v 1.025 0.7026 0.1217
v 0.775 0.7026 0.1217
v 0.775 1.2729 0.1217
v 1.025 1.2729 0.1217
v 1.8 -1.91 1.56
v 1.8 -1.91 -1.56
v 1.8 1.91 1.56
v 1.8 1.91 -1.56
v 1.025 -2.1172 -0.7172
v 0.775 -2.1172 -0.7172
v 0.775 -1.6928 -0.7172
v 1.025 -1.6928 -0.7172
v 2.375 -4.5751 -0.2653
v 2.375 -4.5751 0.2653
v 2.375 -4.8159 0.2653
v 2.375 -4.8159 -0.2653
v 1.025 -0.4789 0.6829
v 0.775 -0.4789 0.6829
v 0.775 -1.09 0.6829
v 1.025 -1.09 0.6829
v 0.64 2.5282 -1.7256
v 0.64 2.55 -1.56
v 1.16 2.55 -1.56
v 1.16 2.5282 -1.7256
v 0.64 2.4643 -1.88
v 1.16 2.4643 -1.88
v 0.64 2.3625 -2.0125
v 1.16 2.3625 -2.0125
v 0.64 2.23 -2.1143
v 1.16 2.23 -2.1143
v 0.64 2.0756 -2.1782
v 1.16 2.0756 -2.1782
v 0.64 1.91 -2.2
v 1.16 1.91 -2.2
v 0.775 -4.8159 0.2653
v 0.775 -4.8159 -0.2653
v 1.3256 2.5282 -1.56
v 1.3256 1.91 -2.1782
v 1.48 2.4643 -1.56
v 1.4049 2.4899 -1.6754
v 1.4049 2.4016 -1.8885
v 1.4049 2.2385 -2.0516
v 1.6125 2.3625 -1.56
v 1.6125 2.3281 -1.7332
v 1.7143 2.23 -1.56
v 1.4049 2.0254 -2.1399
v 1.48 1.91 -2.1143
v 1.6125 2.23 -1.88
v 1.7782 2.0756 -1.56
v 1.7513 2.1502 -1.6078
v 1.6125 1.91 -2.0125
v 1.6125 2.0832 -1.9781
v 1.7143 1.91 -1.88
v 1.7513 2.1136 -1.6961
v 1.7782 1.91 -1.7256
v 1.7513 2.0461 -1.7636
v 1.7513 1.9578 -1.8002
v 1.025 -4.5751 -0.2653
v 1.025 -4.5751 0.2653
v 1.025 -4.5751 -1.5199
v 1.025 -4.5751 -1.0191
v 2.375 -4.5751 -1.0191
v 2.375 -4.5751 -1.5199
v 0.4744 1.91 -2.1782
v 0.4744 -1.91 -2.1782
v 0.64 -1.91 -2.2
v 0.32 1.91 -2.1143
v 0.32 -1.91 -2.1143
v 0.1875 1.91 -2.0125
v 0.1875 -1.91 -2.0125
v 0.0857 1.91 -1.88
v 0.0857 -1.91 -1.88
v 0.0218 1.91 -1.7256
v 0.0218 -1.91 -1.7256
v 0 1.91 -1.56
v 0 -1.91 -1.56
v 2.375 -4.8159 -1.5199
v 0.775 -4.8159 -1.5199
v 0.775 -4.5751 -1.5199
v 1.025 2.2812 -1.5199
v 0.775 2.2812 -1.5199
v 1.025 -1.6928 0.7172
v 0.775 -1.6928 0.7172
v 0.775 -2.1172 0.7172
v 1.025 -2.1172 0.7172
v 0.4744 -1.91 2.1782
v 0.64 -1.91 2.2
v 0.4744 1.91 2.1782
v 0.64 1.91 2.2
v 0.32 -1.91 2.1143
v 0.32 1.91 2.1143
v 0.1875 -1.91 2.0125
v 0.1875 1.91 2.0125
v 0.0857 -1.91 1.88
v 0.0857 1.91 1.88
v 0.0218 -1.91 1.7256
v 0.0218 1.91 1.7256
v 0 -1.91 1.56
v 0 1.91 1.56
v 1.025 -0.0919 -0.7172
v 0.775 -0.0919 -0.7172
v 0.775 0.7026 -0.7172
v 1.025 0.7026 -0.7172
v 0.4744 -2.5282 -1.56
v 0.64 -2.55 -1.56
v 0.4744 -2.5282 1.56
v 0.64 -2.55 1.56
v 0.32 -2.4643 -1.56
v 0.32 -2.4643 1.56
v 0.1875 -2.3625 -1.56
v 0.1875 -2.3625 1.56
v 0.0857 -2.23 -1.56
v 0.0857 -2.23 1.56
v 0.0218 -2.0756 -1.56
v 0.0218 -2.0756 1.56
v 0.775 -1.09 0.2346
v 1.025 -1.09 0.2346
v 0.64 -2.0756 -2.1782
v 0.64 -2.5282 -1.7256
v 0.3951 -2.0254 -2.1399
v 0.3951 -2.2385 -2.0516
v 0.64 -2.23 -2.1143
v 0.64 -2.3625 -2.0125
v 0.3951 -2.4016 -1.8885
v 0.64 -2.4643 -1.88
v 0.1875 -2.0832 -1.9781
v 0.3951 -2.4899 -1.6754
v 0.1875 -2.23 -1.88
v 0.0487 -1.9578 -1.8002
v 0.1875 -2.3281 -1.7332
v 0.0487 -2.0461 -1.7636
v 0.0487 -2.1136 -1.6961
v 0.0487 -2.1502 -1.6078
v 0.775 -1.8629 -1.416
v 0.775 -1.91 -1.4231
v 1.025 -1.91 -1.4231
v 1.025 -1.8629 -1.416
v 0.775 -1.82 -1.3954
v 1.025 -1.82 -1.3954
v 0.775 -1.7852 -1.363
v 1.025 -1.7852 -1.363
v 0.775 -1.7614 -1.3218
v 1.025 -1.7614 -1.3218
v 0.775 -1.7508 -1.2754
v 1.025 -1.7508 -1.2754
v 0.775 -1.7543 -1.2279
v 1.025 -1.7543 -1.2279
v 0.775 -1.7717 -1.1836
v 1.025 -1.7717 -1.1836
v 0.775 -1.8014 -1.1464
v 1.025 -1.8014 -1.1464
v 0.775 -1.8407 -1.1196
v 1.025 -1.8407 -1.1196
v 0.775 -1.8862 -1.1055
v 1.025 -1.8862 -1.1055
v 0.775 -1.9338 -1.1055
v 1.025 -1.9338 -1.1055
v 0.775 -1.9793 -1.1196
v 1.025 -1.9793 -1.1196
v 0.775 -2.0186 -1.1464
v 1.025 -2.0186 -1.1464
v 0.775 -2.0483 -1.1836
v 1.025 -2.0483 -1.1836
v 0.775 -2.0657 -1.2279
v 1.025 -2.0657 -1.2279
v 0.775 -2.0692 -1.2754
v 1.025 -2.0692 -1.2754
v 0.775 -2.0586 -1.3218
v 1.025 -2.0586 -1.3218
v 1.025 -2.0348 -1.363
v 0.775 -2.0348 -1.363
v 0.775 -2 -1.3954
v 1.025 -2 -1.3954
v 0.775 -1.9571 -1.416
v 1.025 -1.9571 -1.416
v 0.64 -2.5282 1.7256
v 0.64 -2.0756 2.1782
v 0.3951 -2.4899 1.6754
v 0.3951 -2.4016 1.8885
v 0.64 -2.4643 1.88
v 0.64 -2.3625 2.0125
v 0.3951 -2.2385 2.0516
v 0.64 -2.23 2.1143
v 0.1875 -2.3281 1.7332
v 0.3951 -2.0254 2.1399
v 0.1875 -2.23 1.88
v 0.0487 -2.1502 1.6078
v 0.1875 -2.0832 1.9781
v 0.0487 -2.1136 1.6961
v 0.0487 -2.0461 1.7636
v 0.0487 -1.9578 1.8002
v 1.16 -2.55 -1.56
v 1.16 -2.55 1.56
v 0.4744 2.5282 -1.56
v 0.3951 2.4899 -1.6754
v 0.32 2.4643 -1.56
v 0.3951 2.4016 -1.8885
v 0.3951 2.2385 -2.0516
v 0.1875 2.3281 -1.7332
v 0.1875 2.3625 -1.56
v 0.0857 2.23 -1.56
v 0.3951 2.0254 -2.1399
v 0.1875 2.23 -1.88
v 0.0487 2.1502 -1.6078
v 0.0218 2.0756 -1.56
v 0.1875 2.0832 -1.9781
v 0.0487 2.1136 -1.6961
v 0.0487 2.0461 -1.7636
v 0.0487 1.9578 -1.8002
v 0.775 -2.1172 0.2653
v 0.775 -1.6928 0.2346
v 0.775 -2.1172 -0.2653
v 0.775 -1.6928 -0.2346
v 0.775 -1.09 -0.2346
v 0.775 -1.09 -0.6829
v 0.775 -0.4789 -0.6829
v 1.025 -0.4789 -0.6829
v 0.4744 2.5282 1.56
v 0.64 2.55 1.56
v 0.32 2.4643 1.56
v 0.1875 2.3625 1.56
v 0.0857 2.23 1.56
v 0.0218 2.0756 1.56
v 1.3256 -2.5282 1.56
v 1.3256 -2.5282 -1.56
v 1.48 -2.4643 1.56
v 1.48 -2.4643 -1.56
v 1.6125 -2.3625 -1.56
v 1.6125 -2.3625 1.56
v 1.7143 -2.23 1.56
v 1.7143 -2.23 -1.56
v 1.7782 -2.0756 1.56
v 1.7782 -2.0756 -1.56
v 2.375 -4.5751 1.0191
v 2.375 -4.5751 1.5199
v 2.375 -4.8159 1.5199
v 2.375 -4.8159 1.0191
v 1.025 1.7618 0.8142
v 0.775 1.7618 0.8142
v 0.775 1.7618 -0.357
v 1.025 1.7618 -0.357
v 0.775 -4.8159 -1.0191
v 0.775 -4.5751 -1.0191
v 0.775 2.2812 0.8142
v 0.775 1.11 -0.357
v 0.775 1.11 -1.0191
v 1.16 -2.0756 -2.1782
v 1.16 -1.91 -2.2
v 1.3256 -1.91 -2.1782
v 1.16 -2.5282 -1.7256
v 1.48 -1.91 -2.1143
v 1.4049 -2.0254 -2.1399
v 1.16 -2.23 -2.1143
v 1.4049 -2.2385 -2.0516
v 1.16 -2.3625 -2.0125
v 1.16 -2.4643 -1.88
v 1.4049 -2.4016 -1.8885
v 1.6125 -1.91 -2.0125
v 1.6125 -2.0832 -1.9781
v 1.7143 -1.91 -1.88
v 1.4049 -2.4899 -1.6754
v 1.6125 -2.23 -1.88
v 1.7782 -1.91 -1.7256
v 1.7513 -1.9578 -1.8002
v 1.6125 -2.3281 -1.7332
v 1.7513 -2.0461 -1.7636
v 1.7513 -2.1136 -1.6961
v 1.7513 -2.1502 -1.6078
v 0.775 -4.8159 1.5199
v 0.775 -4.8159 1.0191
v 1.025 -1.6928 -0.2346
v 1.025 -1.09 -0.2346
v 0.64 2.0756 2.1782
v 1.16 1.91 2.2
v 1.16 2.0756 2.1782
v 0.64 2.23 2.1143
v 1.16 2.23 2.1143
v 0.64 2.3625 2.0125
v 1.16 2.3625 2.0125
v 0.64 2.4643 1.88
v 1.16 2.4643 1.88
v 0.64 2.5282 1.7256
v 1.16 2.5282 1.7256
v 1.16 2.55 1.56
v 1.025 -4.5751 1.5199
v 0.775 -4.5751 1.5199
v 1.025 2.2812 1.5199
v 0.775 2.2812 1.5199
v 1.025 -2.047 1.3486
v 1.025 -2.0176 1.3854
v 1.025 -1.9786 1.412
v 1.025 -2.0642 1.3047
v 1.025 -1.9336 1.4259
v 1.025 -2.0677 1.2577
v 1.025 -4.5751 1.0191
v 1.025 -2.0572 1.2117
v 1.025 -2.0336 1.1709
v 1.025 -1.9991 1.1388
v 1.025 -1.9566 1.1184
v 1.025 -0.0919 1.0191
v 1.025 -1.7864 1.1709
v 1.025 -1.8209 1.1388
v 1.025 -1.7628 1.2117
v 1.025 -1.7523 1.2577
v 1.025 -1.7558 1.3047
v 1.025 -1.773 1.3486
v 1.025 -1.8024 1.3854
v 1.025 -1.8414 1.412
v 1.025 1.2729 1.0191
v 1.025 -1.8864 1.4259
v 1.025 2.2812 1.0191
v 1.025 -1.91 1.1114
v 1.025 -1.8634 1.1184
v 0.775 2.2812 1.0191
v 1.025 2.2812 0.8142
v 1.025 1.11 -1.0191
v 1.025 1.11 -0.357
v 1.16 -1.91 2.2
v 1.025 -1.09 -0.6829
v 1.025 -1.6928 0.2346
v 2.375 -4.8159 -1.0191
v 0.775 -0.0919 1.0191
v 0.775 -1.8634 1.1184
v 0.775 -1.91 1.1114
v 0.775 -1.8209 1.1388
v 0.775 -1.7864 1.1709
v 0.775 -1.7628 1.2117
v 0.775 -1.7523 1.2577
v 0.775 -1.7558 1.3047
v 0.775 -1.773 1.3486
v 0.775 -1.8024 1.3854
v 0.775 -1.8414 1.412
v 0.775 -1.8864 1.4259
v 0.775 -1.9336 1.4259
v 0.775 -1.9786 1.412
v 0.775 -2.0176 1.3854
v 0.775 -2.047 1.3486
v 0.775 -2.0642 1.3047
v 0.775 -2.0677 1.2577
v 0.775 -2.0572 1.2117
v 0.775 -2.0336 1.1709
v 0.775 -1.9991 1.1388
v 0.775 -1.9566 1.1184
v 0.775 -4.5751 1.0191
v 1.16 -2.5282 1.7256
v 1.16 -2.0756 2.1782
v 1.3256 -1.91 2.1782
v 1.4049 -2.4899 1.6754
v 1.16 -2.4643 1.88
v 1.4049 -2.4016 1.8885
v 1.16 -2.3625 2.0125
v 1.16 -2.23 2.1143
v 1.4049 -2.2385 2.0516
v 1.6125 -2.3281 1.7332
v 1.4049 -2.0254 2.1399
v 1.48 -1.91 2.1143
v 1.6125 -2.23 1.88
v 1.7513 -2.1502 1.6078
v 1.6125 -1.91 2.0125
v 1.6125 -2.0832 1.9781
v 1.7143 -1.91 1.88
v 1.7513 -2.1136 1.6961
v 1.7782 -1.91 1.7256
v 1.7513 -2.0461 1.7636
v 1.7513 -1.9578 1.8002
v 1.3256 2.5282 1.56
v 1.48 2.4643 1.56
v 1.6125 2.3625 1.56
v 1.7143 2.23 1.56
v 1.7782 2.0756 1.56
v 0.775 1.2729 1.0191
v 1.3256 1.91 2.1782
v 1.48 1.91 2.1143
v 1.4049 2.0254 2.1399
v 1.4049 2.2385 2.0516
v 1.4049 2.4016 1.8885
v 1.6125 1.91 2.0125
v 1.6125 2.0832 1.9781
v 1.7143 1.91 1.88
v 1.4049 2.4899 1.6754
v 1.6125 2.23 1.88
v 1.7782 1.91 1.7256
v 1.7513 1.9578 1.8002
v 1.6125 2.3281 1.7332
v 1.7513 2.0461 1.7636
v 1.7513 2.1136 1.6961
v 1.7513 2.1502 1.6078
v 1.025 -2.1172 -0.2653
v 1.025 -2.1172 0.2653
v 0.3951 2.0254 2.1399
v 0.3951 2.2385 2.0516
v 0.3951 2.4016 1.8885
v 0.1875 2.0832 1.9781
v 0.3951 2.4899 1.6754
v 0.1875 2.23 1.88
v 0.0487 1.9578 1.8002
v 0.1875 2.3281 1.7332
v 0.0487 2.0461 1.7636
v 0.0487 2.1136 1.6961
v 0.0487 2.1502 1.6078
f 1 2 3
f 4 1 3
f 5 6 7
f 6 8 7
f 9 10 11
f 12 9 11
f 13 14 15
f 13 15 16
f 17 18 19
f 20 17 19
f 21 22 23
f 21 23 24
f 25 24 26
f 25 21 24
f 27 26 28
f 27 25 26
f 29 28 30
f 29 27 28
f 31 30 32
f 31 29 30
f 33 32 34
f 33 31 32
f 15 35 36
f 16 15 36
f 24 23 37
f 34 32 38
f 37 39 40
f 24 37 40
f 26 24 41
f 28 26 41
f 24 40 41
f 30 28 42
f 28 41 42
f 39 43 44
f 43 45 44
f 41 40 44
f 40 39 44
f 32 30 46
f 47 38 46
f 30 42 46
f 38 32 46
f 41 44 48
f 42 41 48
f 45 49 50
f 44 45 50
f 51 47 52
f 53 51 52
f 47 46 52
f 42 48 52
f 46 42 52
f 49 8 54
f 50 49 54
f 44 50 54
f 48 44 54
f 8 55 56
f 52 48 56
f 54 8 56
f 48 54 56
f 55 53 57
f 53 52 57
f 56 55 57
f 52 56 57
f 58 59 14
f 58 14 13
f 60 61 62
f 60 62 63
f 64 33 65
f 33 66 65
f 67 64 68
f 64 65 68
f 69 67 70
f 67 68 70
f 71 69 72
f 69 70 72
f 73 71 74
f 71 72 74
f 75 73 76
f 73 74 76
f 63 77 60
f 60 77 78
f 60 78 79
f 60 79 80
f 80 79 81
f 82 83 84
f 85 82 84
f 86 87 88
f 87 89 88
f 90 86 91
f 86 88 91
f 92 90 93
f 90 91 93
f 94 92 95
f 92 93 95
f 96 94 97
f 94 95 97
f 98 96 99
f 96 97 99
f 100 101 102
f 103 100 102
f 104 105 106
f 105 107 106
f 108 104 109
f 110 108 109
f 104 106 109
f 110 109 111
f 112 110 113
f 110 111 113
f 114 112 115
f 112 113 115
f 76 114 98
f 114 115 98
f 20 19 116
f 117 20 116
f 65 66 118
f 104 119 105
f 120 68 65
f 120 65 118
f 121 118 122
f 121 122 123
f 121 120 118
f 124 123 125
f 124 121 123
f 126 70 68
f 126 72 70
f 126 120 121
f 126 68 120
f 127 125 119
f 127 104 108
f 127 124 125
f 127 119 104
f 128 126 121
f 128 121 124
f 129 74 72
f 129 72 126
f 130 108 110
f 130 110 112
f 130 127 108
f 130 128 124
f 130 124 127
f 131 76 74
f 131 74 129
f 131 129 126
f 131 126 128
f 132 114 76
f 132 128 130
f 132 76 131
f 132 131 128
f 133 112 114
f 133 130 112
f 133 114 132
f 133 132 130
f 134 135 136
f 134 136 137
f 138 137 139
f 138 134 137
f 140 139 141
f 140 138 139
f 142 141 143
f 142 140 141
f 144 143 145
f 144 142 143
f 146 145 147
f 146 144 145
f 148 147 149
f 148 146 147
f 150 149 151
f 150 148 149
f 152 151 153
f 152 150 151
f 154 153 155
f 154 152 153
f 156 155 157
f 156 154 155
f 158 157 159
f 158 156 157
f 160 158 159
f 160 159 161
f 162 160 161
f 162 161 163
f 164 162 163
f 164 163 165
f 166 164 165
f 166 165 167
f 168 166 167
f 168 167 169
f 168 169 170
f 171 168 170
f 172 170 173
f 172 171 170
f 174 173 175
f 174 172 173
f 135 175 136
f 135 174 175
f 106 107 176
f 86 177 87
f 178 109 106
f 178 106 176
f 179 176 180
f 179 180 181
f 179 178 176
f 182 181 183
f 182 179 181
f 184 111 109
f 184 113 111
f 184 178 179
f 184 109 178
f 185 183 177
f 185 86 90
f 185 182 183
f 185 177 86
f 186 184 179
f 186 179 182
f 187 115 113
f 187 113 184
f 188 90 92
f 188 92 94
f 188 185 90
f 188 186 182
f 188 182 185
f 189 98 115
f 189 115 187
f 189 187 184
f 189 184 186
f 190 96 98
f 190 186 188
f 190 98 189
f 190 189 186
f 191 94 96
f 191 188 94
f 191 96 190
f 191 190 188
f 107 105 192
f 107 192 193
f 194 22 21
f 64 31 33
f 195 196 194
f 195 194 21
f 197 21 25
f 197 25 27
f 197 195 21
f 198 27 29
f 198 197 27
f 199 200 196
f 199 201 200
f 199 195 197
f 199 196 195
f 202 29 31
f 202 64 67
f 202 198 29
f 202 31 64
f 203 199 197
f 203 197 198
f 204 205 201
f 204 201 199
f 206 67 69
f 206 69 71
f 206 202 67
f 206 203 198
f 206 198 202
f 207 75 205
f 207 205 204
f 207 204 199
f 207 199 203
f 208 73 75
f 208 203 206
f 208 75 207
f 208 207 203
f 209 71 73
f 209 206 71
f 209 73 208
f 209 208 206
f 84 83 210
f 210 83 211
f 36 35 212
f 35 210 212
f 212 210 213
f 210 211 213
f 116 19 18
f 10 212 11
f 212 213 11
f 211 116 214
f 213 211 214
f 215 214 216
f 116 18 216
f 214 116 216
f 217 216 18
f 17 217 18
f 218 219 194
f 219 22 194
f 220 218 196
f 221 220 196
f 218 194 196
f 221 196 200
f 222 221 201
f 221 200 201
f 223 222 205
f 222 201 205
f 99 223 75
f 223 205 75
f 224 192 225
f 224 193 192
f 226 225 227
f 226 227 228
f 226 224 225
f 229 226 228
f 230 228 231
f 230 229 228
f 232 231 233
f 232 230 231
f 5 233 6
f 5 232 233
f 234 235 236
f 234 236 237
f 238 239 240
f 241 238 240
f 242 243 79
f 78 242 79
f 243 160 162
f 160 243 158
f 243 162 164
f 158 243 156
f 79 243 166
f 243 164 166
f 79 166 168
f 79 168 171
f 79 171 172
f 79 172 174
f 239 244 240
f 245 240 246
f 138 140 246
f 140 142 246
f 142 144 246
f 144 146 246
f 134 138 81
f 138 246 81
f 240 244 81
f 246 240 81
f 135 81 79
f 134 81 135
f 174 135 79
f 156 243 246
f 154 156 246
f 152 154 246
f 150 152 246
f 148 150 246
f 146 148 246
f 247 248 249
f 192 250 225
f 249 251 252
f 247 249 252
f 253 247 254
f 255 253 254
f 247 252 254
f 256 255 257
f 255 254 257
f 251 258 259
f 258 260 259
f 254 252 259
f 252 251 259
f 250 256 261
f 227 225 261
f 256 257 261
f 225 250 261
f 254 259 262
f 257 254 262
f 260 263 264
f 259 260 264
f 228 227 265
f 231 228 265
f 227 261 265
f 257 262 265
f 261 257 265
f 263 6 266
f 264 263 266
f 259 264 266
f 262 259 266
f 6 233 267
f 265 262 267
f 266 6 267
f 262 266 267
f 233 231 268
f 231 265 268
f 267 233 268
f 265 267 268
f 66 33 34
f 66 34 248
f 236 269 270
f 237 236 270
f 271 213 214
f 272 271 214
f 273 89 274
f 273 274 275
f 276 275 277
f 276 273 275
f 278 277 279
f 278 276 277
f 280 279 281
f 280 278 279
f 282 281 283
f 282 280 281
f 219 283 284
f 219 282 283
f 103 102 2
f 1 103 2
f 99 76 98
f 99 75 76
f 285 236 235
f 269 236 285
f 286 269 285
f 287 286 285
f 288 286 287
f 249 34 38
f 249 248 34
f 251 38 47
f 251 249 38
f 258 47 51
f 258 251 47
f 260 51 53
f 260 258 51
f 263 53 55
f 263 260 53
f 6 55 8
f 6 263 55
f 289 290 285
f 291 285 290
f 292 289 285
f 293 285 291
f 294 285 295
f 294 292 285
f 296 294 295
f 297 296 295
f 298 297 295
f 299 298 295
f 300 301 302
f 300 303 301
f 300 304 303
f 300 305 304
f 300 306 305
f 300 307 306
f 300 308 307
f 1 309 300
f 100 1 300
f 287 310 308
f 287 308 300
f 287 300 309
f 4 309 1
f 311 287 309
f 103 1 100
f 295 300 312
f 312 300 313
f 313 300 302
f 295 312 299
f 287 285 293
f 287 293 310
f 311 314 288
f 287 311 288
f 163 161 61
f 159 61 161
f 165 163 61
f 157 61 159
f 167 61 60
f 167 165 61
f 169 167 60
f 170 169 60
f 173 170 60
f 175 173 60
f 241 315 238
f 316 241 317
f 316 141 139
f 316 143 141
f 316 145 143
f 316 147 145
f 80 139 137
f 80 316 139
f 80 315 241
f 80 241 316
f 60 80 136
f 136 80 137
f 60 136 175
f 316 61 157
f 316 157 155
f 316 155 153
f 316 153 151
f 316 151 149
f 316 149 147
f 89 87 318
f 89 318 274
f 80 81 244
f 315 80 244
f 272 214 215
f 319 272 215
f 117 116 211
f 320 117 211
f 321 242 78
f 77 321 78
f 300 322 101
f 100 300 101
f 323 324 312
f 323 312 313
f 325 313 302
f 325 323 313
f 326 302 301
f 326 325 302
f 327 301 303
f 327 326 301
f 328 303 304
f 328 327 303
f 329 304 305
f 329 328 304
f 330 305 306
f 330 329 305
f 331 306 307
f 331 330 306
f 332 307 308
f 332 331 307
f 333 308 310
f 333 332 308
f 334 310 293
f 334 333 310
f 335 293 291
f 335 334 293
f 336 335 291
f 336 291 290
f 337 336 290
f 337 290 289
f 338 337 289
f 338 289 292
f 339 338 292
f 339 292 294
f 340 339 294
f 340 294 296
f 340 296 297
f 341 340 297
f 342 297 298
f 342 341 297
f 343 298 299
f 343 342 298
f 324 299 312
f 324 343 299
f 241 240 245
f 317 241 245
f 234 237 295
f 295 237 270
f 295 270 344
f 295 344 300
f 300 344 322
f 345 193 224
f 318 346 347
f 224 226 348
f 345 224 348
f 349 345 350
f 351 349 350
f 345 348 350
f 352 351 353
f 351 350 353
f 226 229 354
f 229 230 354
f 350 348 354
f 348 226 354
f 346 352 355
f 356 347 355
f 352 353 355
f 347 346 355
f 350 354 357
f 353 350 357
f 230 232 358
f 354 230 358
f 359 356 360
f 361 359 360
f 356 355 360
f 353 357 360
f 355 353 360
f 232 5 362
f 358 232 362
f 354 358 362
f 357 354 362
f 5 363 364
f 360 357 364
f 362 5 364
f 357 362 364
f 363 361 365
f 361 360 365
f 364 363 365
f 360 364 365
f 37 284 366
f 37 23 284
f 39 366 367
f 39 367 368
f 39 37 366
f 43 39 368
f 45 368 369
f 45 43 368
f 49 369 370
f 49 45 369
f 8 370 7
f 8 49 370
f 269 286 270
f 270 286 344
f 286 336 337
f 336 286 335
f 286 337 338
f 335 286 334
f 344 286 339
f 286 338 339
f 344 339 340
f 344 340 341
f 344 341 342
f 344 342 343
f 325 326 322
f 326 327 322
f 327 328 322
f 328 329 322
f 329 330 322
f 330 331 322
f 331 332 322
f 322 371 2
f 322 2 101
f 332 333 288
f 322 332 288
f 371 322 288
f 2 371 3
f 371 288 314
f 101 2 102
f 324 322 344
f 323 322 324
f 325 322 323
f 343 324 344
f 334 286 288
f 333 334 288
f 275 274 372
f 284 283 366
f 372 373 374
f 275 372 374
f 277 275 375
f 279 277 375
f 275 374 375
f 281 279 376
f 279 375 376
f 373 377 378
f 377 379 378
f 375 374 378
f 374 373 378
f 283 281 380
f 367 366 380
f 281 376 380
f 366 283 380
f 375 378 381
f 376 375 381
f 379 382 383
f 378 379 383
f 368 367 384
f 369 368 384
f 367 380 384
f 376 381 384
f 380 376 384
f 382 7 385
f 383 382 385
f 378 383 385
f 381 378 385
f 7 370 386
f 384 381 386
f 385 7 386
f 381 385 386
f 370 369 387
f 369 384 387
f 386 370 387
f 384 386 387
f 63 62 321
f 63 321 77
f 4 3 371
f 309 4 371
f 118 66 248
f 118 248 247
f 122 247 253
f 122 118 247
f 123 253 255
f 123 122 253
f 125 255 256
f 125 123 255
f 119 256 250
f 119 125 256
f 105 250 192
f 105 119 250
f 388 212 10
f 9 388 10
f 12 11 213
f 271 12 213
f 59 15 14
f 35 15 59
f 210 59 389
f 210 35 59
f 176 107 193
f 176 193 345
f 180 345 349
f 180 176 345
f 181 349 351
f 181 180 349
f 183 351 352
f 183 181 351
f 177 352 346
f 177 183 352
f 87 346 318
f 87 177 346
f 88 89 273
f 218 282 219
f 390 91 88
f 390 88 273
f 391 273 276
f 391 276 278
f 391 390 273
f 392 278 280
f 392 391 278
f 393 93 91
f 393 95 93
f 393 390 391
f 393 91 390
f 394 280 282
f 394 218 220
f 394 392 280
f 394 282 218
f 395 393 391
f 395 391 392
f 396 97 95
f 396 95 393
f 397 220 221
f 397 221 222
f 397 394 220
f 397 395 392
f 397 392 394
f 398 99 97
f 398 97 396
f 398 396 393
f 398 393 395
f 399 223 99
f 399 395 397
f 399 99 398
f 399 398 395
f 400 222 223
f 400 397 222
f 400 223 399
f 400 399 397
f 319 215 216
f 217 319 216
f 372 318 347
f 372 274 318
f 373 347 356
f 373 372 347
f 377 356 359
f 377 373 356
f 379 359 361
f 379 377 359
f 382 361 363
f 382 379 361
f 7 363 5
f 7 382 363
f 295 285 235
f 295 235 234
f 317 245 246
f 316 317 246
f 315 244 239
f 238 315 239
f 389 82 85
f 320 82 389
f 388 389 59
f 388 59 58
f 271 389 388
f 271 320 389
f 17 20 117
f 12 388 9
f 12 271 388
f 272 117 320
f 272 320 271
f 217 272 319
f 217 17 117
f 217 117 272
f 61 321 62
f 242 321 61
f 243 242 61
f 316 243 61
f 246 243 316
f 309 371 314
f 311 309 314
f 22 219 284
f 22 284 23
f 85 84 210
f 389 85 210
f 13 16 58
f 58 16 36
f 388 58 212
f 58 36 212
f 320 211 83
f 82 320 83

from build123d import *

# Parameters (mm, degrees)
BOSS_EXTRUDE1_DEPTH        = 1.8
FILLET1_R                  = 0.64
BOSS_EXTRUDE2_DEPTH        = 0.125
BOSS_EXTRUDE2_DEPTH_BACK   = 0.125
BOSS_EXTRUDE2_2_DEPTH      = 0.125
BOSS_EXTRUDE2_2_DEPTH_BACK = 0.125
SKETCH2_R                  = 0.15814457
BOSS_EXTRUDE2_3_DEPTH      = 0.125
BOSS_EXTRUDE2_3_DEPTH_BACK = 0.125
SKETCH2_R_2                = 0.159684068
SKETCH4_W                  = 0.500795775
SKETCH4_H                  = 0.240858333
SKETCH4_W_2                = 0.530680686
BOSS_EXTRUDE3_DEPTH        = 1.6


with BuildPart() as part:
    # Sketch1 → Boss-Extrude1 (new body)
    with BuildSketch(Plane(origin=(0, 0, 0), x_dir=(0, 0, -1), z_dir=(1, 0, 0))):
        with BuildLine():
            Line((-1.56, 2.55), (1.56, 2.55))
            ThreePointArc((1.56, 2.55), (2.01254834, 2.36254834), (2.2, 1.91))
            Line((2.2, 1.91), (2.2, -1.91))
            ThreePointArc((2.2, -1.91), (2.01254834, -2.36254834), (1.56, -2.55))
            Line((1.56, -2.55), (-1.56, -2.55))
            ThreePointArc((-1.56, -2.55), (-2.01254834, -2.36254834), (-2.2, -1.91))
            Line((-2.2, -1.91), (-2.2, 1.91))
            ThreePointArc((-2.2, 1.91), (-2.01254834, 2.36254834), (-1.56, 2.55))
        make_face()
    extrude(amount=BOSS_EXTRUDE1_DEPTH)

    # Fillet1
    fillet1_edges = [part.edges().sort_by_distance(p)[0] for p in [
        (1.8, -2.36254834, -2.01254834),
        (0, -2.55, 0),
        (0, -2.36254834, 2.01254834),
        (1.8, 0, -2.2),
        (1.8, 2.36254834, -2.01254834),
        (1.8, 2.55, 0),
        (1.8, 2.36254834, 2.01254834),
        (1.8, 0, 2.2),
        (1.8, -2.36254834, 2.01254834),
        (1.8, -2.55, 0),
        (0, 0, 2.2),
        (0, 2.36254834, 2.01254834),
        (0, 2.55, 0),
        (0, 2.36254834, -2.01254834),
        (0, 0, -2.2),
        (0, -2.36254834, -2.01254834),
    ]]
    fillet(fillet1_edges, radius=FILLET1_R)


with BuildPart() as body_2:
    # Sketch2 → Boss-Extrude2 (new, two sides: drawn at the far end of the back side and taken through both)
    with BuildSketch(Plane(origin=(0.9, 0, 0), x_dir=(0, 0, -1), z_dir=(1, 0, 0)).offset(-BOSS_EXTRUDE2_DEPTH_BACK)):
        Polygon((0.234638485, -1.692845196), (0.234638485, -1.089961788), (0.682917026, -1.089961788), (0.682917026, -0.478873961), (-0.682917026, -0.478873961), (-0.682917026, -1.089961788), (-0.234638485, -1.089961788), (-0.234638485, -1.692845196), (-0.71721526, -1.692845196), (-0.71721526, -2.117211743), (-0.265340343, -2.117211743), (-0.265340343, -4.575084305), (0.265340343, -4.575084305), (0.265340343, -2.117211743), (0.71721526, -2.117211743), (0.71721526, -1.692845196), align=None)
    extrude(amount=BOSS_EXTRUDE2_DEPTH + BOSS_EXTRUDE2_DEPTH_BACK)



with BuildPart() as body_3:
    # Sketch2 → Boss-Extrude2 2 (new, two sides: drawn at the far end of the back side and taken through both)
    with BuildSketch(Plane(origin=(0.9, 0, 0), x_dir=(0, 0, -1), z_dir=(1, 0, 0)).offset(-BOSS_EXTRUDE2_2_DEPTH_BACK)):
        Polygon((-1.519901832, -1.501575177), (-1.519901832, -4.575084305), (-1.019106057, -4.575084305), (-1.019106057, -2.263381464), (-1.019106057, -0.09185167), (0.71721526, -0.09185167), (0.71721526, 0.702562506), (-0.121681947, 0.702562506), (-0.121681947, 1.272911146), (-1.019106057, 1.272911146), (-1.019106057, 2.281206061), (-1.519901832, 2.281206061), align=None)
        with Locations((-1.269503945, -1.91)):
            Circle(SKETCH2_R, mode=Mode.SUBTRACT)
    extrude(amount=BOSS_EXTRUDE2_2_DEPTH + BOSS_EXTRUDE2_2_DEPTH_BACK)


with BuildPart() as body_4:
    # Sketch2 → Boss-Extrude2 3 (new, two sides: drawn at the far end of the back side and taken through both)
    with BuildSketch(Plane(origin=(0.9, 0, 0), x_dir=(0, 0, -1), z_dir=(1, 0, 0)).offset(-BOSS_EXTRUDE2_3_DEPTH_BACK)):
        Polygon((1.019106057, -2.263381464), (1.019106057, -4.575084305), (1.519901832, -4.575084305), (1.519901832, -1.501575177), (1.519901832, 1.91), (1.519901832, 2.281206061), (-0.814248152, 2.281206061), (-0.814248152, 1.761781408), (0.357003518, 1.761781408), (0.357003518, 1.109954392), (1.019106057, 1.109954392), align=None)
        with Locations((1.263450462, -1.91)):
            Circle(SKETCH2_R_2, mode=Mode.SUBTRACT)
    extrude(amount=BOSS_EXTRUDE2_3_DEPTH + BOSS_EXTRUDE2_3_DEPTH_BACK)


with BuildPart() as body_2_1:
    add(body_2.part)

    add(body_3.part)  # Boss-Extrude3 merges body 3

    add(body_4.part)  # Boss-Extrude3 merges body 4
    # Sketch4 → Boss-Extrude3 (add)
    with BuildSketch(Plane(origin=(0.775, 0, 0), x_dir=(0, 0, -1), z_dir=(1, 0, 0))):
        with Locations((-1.269503945, -4.695513471)):
            Rectangle(SKETCH4_W, SKETCH4_H)
        with Locations((0, -4.695513471)):
            Rectangle(SKETCH4_W_2, SKETCH4_H)
        with Locations((1.269503945, -4.695513471)):
            Rectangle(SKETCH4_W, SKETCH4_H)
    extrude(amount=BOSS_EXTRUDE3_DEPTH)


solid = Compound([part.part, body_2_1.part])
